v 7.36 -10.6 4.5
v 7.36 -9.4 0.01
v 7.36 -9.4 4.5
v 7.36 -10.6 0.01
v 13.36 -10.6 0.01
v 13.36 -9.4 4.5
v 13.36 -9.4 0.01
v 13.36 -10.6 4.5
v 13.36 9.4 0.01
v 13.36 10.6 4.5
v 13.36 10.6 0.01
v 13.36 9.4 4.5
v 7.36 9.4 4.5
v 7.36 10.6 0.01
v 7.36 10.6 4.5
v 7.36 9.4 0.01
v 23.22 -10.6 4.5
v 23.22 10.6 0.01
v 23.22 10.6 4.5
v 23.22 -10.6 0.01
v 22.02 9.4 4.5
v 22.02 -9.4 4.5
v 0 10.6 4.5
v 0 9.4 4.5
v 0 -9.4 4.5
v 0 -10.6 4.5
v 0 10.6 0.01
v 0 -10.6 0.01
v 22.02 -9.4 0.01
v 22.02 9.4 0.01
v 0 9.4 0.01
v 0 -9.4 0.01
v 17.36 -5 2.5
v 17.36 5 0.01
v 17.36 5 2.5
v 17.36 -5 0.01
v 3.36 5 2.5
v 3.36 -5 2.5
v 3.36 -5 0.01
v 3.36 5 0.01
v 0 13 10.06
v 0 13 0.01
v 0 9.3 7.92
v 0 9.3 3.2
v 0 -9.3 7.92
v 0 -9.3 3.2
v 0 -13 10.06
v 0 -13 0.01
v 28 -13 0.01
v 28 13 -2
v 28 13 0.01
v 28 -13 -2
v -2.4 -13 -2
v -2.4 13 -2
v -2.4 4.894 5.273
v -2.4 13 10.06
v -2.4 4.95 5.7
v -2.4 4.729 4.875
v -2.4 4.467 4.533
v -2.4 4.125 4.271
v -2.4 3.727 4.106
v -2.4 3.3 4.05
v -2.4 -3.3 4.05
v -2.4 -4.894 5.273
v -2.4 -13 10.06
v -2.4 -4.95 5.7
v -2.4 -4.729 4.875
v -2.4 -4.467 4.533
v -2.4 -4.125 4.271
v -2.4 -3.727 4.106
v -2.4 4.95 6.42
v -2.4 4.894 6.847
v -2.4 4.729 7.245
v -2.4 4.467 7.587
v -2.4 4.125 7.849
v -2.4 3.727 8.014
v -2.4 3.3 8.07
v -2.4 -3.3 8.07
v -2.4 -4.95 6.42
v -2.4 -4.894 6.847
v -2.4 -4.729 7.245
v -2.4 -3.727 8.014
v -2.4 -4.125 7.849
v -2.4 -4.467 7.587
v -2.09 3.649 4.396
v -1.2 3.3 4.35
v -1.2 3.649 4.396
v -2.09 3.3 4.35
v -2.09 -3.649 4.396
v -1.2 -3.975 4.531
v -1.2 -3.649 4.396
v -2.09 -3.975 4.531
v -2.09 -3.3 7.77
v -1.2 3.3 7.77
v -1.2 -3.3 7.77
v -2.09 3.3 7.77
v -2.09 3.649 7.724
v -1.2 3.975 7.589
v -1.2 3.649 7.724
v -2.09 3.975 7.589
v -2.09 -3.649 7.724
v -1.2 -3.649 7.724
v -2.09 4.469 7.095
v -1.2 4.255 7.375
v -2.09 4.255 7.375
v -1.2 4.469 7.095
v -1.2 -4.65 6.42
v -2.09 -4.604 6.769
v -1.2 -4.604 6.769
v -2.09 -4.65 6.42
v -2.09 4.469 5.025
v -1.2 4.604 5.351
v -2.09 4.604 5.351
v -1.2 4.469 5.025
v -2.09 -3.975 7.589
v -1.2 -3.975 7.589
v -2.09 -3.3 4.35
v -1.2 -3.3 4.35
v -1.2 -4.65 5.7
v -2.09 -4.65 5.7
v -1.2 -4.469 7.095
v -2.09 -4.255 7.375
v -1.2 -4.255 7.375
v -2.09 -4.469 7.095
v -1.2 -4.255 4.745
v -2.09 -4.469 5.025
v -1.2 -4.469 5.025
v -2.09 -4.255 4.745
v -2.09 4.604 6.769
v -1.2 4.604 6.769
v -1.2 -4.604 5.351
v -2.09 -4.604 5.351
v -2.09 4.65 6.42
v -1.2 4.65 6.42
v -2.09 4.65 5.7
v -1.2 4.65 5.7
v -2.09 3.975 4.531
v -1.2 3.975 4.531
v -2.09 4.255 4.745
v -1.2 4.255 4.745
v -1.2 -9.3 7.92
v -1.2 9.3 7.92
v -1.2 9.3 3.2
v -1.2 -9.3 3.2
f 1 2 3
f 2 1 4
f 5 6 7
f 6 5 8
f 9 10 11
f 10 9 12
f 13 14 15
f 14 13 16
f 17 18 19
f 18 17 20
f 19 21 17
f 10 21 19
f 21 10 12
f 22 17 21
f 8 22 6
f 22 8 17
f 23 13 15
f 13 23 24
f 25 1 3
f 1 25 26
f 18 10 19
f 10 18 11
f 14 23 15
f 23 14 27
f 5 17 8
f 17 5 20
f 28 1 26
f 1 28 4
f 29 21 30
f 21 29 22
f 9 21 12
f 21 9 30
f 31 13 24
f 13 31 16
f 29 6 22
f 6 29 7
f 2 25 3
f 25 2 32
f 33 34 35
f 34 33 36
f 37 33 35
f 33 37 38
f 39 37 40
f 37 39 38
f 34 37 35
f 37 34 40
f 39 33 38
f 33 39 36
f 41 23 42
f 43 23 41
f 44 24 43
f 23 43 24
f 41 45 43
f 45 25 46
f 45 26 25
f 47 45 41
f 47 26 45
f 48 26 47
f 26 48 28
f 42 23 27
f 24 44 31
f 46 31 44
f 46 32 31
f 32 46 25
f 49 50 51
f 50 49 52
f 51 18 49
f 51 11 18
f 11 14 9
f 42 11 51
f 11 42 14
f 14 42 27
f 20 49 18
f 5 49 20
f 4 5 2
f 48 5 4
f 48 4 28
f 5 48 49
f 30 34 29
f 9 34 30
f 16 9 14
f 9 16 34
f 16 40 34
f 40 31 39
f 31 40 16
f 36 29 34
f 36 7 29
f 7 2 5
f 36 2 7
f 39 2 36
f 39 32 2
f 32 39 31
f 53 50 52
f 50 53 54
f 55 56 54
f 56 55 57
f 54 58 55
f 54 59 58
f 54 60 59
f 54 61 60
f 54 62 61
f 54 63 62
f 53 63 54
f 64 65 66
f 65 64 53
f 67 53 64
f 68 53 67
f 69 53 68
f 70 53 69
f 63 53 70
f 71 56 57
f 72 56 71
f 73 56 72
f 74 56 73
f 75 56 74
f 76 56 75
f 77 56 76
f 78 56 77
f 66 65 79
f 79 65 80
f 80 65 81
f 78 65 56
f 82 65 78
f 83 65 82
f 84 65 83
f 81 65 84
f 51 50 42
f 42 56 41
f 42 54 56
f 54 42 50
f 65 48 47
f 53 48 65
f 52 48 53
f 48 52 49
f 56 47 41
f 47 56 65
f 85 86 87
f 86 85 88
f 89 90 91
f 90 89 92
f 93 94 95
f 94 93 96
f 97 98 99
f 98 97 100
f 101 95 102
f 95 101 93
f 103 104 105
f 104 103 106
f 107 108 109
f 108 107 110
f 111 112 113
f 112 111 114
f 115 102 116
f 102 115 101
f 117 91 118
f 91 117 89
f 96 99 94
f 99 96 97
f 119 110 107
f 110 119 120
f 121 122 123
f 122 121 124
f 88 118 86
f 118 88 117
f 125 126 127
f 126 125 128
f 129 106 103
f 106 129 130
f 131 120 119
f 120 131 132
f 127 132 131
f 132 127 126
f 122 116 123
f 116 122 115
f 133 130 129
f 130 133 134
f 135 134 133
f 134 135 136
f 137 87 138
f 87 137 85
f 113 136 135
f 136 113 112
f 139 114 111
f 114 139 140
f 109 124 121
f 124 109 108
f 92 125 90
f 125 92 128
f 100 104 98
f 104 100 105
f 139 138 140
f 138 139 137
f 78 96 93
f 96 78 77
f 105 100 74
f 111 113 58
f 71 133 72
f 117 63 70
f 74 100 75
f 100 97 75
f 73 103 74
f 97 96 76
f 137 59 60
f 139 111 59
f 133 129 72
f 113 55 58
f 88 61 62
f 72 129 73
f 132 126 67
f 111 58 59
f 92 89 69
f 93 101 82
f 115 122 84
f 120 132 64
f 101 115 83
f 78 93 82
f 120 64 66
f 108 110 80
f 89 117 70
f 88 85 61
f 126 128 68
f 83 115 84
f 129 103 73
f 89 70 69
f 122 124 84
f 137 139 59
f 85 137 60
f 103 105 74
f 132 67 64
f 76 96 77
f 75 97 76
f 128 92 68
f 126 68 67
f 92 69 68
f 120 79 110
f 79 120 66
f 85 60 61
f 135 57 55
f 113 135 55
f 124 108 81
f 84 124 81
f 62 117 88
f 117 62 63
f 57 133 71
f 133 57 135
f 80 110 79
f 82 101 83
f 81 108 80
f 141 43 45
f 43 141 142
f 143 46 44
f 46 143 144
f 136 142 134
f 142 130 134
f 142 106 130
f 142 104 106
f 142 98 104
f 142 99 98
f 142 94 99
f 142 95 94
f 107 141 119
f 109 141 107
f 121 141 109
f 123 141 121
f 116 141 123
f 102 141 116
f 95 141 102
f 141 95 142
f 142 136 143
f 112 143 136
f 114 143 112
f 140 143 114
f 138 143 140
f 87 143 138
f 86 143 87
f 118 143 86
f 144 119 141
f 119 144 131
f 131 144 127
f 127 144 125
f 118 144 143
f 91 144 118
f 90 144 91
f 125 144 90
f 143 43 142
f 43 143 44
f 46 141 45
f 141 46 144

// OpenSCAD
// file: ../../usb-c-port/usb-c-port.scad
//-----------------------------------------------------------------------
// USB-C port through a wall, flush: the socket's metal shell sits in a
// close-fitting pocket in the wall, walled in on all four sides, its face
// level with the outside. The cable seats the way it does on a laptop.
//
// A board's socket only overhangs the board edge by a mm or so, less than
// the wall. So the board's end tucks into a shallow relief in the wall's
// inner face, the width of the board, leaving the wall round the socket
// thin enough for the face to reach the outside. When that would leave less
// than usbcMinWall (a socket that barely overhangs), the face sits back from
// the outside instead: usbcRecess() says how far.
//
// Modules, all in the same frame:
//   usbcGhost()     the socket and the board's end, for previews
//   usbcWallCut()   subtract from the wall: socket pocket and board relief
//
// Frame: origin on the floor top at the wall's inner face, under the socket's
// axis. +X into the box, Z up. The wall is X = -wall .. 0. The board is
// component side up, socket on top (top-mount, as on the FireBeetle, C3 Super
// Mini and S3 DevKitC). Units: mm.
//
// usbcBoardEdgeX() gives where the board's edge lands (negative: inside the
// wall), so a holder can put its posts or pocket to match.
//-----------------------------------------------------------------------

//-- The socket: USB-C receptacle shell (USB-IF 8.34 x 2.56 plug, receptacle shell ~8.94 x 3.26)
usbcShellW     = 8.94;
usbcShellH     = 3.26;    // CAL per board: measured 3.2 on the FireBeetle
usbcShellR     = 1.2;     // CAL: end radius. Full round would be 1.63; most shells are squarer
usbcShellDepth = 7.35;    // face to back

//-- The pocket
usbcClearance  = 0.15;    // CAL: per side, shell to pocket. Set by the fit piece
usbcMinWall    = 1.0;     // thinnest wall left round the socket
usbcReliefGap  = 0.3;     // board relief over the board, each side and above/below
usbcChamfer    = 0.3;     // lead-in on the outside edge

//-- How far the socket face sits back from the outside: 0 (flush) unless the socket
//-- overhangs the board edge by less than usbcMinWall
function usbcRecess(overhang, minWall = usbcMinWall) = max(0, minWall - overhang);
//-- X of the board's socket edge in this frame
function usbcBoardEdgeX(wall, overhang, recess) =
  -wall + (is_undef(recess) ? usbcRecess(overhang) : recess) + overhang;
//-- Z of the board's underside above the floor top
function usbcBoardZ(axisZ, pcb, shellH = usbcShellH) = axisZ - shellH/2 - pcb;

module usbcShell2D(grow = 0, w = usbcShellW, h = usbcShellH, r = usbcShellR)
{
  offset(r = r + grow, $fn = 24) square([w - 2*r, h - 2*r], center = true);
}

//-- axisZ: socket axis above the floor. boardW/pcb: the board, for the ghost and relief.
//-- shift: socket centre across the board's width from the board's centre line (+Y)
module usbcGhost(axisZ, wall, overhang, boardW, pcb = 1.6, recess, shift = 0, shellH = usbcShellH, shellW = usbcShellW)
{
  ex = usbcBoardEdgeX(wall, overhang, recess);
  %color("Silver") translate([ex - overhang, 0, axisZ]) rotate([0, 90, 0]) rotate([0, 0, 90])
    linear_extrude(usbcShellDepth) usbcShell2D(w = shellW, h = shellH);
  %color("DarkSlateGray") translate([ex, -boardW/2 - shift, usbcBoardZ(axisZ, pcb, shellH)]) cube([12, boardW, pcb]);
}

module usbcWallCut(axisZ, wall, overhang, boardW, pcb = 1.6, recess, shift = 0,
                   clearance = usbcClearance, shellH = usbcShellH, shellW = usbcShellW, aboveBoard)
{
  rc = is_undef(recess) ? usbcRecess(overhang) : recess;
  ex = usbcBoardEdgeX(wall, overhang, rc);
  bz = usbcBoardZ(axisZ, pcb, shellH);
  //-- what stands on the board near its edge: the socket, unless told taller
  up = is_undef(aboveBoard) ? shellH : aboveBoard;
  assert(ex - overhang + wall >= -0.01, "socket face would stand proud of the wall");
  assert(rc > 0 || overhang >= usbcMinWall - 0.01, "wall round the socket under usbcMinWall");
  //-- socket pocket, through the wall
  translate([-wall - 1, 0, axisZ]) rotate([0, 90, 0]) rotate([0, 0, 90])
    linear_extrude(wall + 2) usbcShell2D(clearance, w = shellW, h = shellH);
  //-- lead-in chamfer on the outside
  translate([-wall, 0, axisZ]) rotate([0, 90, 0]) rotate([0, 0, 90])
    hull()
    {
      translate([0, 0, -0.01]) linear_extrude(0.01) usbcShell2D(clearance + usbcChamfer, w = shellW, h = shellH);
      translate([0, 0, usbcChamfer]) linear_extrude(0.01) usbcShell2D(clearance, w = shellW, h = shellH);
    }
  //-- board relief in the inner face, when the board's edge lands inside the wall
  if (ex < 0)
    translate([ex - usbcReliefGap, -boardW/2 - shift - usbcReliefGap, bz - usbcReliefGap])
      cube([-ex + usbcReliefGap + 1, boardW + 2*usbcReliefGap, pcb + up + 2*usbcReliefGap]);
}
// file: ../../board-pocket/board-pocket.scad
//-----------------------------------------------------------------------
// Board pocket: holds a board that has no mounting holes
//
// The board sits on a central pedestal with a pad of double-sided foam tape
// on top, inside a low wall that follows its outline. The pedestal keeps
// the board's edges off the floor, so lead stubs soldered through the edge
// holes have room underneath; gaps in the wall let the leads out. The wall
// only locates the board: the tape holds it down, and in a closed box a lid
// pad presses a pad of foam onto it (boardLidPad below).
//
// Modules, all in the same frame:
//   boardPocketGhost()   the board and its tape, for previews
//   boardPocketHolder()  the plastic: pedestal and outline wall, add to the floor
//   boardLidPad()        a block hanging from the lid that presses foam onto the board
//   boardLidPadGhost()   the foam under it, squashed, for previews
//
// Frame: origin on the floor top, under the centre of the board's outline.
// X along the board's length l, Y across its width w, Z up. Units: mm.
//
// Sides are listed [-X, +X, -Y, +Y], each one of
//   "gap"    wall with a gap in the middle for leads (gapW wide)
//   "solid"  whole wall: use it where the board takes a push (a plug)
//   "open"   no wall: the board's edge goes into a box wall (a USB port)
//
// Used by esp32-c3-supermini, esp32-s3-devkitc and rs485-max485.
//-----------------------------------------------------------------------

//-- From the controller project's receiver.scad / rack-end.scad (boardPocket), 2026-10-30
bpPedestal  = 2.5;     // floor to the tape: room for lead stubs under the board edges
bpTape      = 1.0;     // double-sided foam tape on the pedestal. CAL: how far it squashes
bpWall      = 1.2;     // outline wall thickness
bpRise      = 1.0;     // wall top above the PCB underside (the controller project's rack-end: 0.8 under the S3's module)
bpClearance = 0.4;     // per side, board outline to wall: PETG. 0.3 for PLA. Set by the fit piece
bpGapW      = 6;       // lead gap in a "gap" side
bpPadInset  = 4;       // default pedestal: the board less this all round

//-- Lid hold-down (the controller project's receiver / rack-end lid pads)
bpFoam      = 3.0;     // CAL: self-adhesive foam stuck under each lid pad
bpSqueeze   = 1.0;     // how far the lid squashes it: ~1/3 for soft foam, 0.3 for felt

//-- PCB underside above the floor top
function boardPocketZ(pedestal = bpPedestal, tape = bpTape) = pedestal + tape;
//-- default pedestal [l, w] for a board
function boardPocketPad(l, w, inset = bpPadInset) = [max(l - 2*inset, 4), max(w - 2*inset, 4)];
//-- Z of a lid pad's underside, pressing on a surface at surfaceZ (board top, or a part on it)
function boardLidPadZ(surfaceZ, foam = bpFoam, squeeze = bpSqueeze) =
  assert(squeeze > 0 && squeeze < foam, "foam would not touch the board")
  surfaceZ + foam - squeeze;

function bpSides4(s) = is_list(s) ? s : [s, s, s, s];

module boardPocketGhost(l, w, pcb = 1.6, pad, pedestal = bpPedestal, tape = bpTape)
{
  p = is_undef(pad) ? boardPocketPad(l, w) : pad;
  %color("White") translate([-p[0]/2, -p[1]/2, pedestal]) cube([p[0], p[1], tape]);
  %color("DarkGreen") translate([-l/2, -w/2, pedestal + tape]) cube([l, w, pcb]);
}

//-- pad: pedestal [l, w]; gapW a number or one per side
module boardPocketHolder(l, w, pad, sides = "gap", gapW = bpGapW, clearance = bpClearance,
                         pedestal = bpPedestal, tape = bpTape, wall = bpWall, rise = bpRise)
{
  p   = is_undef(pad) ? boardPocketPad(l, w) : pad;
  s   = bpSides4(sides);
  g   = bpSides4(gapW);
  ix  = l/2 + clearance;                 // inner half sizes
  iy  = w/2 + clearance;
  top = pedestal + tape + rise;
  assert(p[0] <= l && p[1] <= w, "pedestal bigger than the board");
  for (k = s) assert(k == "gap" || k == "solid" || k == "open", str("unknown side ", k));

  //-- pedestal, centred under the board
  translate([-p[0]/2, -p[1]/2, -0.01]) cube([p[0], p[1], pedestal + 0.01]);
  //-- outline wall
  difference()
  {
    translate([-ix - wall, -iy - wall, -0.01]) cube([2*(ix + wall), 2*(iy + wall), top + 0.01]);
    translate([-ix, -iy, -1]) cube([2*ix, 2*iy, top + 2]);
    for (i = [0 : 3])
    {
      //-- each side's cut, drawn for -X then turned into place
      ax = (i < 2) ? ix : iy;         // inner half size across the side
      al = (i < 2) ? iy : ix;         // half length along it
      rotate([0, 0, [0, 180, 90, 270][i]])   // -X, +X, -Y, +Y
      {
        if (s[i] == "gap")
          translate([-ax - wall - 1, -g[i]/2, -1]) cube([wall + 2, g[i], top + 2]);
        if (s[i] == "open")
          translate([-ax - wall - 1, -al - wall - 1, -1]) cube([wall + 1.01, 2*(al + wall + 1), top + 2]);
      }
    }
  }
}

//-- A lid pad over the rectangle size [x, y] centred at `at`, from the squashed foam up to
//-- lidZ (the lid's inner face in this frame), running `into` up into the lid plate
module boardLidPad(size, at = [0, 0], surfaceZ, lidZ, foam = bpFoam, squeeze = bpSqueeze, into = 0.5)
{
  z0 = boardLidPadZ(surfaceZ, foam, squeeze);
  assert(lidZ > z0, "lid is below the pad: the box is too low for the foam");
  translate([at[0] - size[0]/2, at[1] - size[1]/2, z0]) cube([size[0], size[1], lidZ - z0 + into]);
}

module boardLidPadGhost(size, at = [0, 0], surfaceZ, foam = bpFoam, squeeze = bpSqueeze)
{
  %color("Gray") translate([at[0] - size[0]/2, at[1] - size[1]/2, surfaceZ]) cube([size[0], size[1], foam - squeeze]);
}
// file: ../esp32-c3-supermini.scad
//-----------------------------------------------------------------------
// ESP32-C3 Super Mini, USB-C through a wall
//
// The board has no mounting holes. It sits on a taped pedestal inside an
// outline pocket (board-pocket), with its USB-C socket in a flush pocket in
// the box wall (usb-c-port). The pocket is open at the wall, where the board's
// end tucks into the wall's relief, and whole at the antenna end, which takes
// the plug's push. Its long sides have gaps for the leads.
//
// To fit: tip the board nose-down a few degrees, put the socket into the
// wall, then lay the antenna end down onto the tape.
//
// Modules, all in the same frame:
//   c3MiniGhost()    the board, socket, buttons and antenna, for previews
//   c3MiniHolder()   the plastic: pedestal and outline pocket, add to the floor
//   c3MiniWallCut()  subtract from the wall: the socket pocket and board relief
//   c3MiniLidPads()  blocks under the lid that press foam onto the board
//
// Frame (as usb-c-port): origin on the floor top at the wall's inner face,
// under the socket's axis. +X into the box (toward the antenna end), Z up.
// The wall is X = -wall .. 0. Units: mm.
//
// The socket height isn't chosen: it follows from the pedestal, the tape and
// the PCB (c3MiniAxisZ). Sizes: pick a row of c3Variants by name, or pass
// length / pcb to override one value.
//-----------------------------------------------------------------------

//-- included, not used, so their default values (bpTape, usbcClearance...) are in scope here
include <../board-pocket/board-pocket.scad>
include <../usb-c-port/usb-c-port.scad>

//-- [name, length, width, pcb, USB-C overhang]. Source: the controller project's parts sheet
c3Variants = [
  ["supermini",     22.52, 18.0, 1.0, 1.5],   // diymore 4-pack B0DS23ML1L: STEP outline, PCB CAL (model 0.9)
  ["supermini-1.6", 22.52, 18.0, 1.6, 1.5],   // sellers listing a 1.6 PCB
  ["supermini-24",  24.0,  18.0, 1.0, 1.5],   // longest seller listing (22.5-24): CAL
  ["supermini-plus",22.52, 18.0, 1.0, 1.5],   // SuperMini Plus (V2): same footprint (mischianti.org); rest CAL
];
c3Variant     = "supermini";

//-- The socket: 9.0 x 3.12 on the STEP. The wall pocket uses usb-c-port's 8.94 shell
c3UsbW        = 9.0;      // from the STEP: its wall pocket is cut to this
c3UsbH        = 3.12;     // CAL
c3UsbDepth    = 7.35;     // ghost only: usb-c-port's typical shell
c3PortClear   = usbcClearance;   // per side, shell to wall pocket: usb-c-port's, set by its fit piece

//-- On the board (ghost and lid pads)
c3ButtonX     = 8.8;      // BOOT / RST centres from the USB edge
c3ButtonY     = 2.95;     // either side of the centre line
c3ButtonH     = 1.7;
c3ButtonSize  = 3.0;      // CAL: ghost only
c3AntennaSize = [2.0, 3.2, 1.2];   // CAL: ceramic chip at the far end, ghost only
c3PinPitch    = 15.24;    // header rows, along the long sides

//-- Holder
c3Pad         = [14, 10]; // pedestal: between the pin rows (the controller project's receiver.scad)
c3Sides       = ["open", "solid", "gap", "gap"];   // wall end, antenna end, long sides

function c3Mini(name = c3Variant) = let (i = search([name], c3Variants)[0])
  assert(i != [] && i != undef, str("unknown C3 variant ", name)) c3Variants[i];
//-- [length, width, pcb, overhang] with overrides
function c3MiniDims(variant = c3Variant, length, pcb) = let (v = c3Mini(variant))
  [is_undef(length) ? v[1] : length, v[2], is_undef(pcb) ? v[3] : pcb, v[4]];
function c3MiniAxisZ(pcb, pedestal = bpPedestal, tape = bpTape) =
  boardPocketZ(pedestal, tape) + pcb + c3UsbH/2;
//-- X of the board's USB edge (negative: inside the wall's relief)
function c3MiniEdgeX(wall, variant = c3Variant) = usbcBoardEdgeX(wall, c3Mini(variant)[4]);

module c3MiniGhost(wall, variant = c3Variant, length, pcb, pedestal = bpPedestal, tape = bpTape)
{
  d  = c3MiniDims(variant, length, pcb);
  ex = usbcBoardEdgeX(wall, d[3]);
  bz = boardPocketZ(pedestal, tape);
  top = bz + d[2];
  translate([ex + d[0]/2, 0, 0]) boardPocketGhost(d[0], d[1], d[2], c3Pad, pedestal, tape);
  %color("Silver") translate([ex - d[3], 0, top + c3UsbH/2]) rotate([0, 90, 0]) rotate([0, 0, 90])
    linear_extrude(c3UsbDepth) usbcShell2D(w = c3UsbW, h = c3UsbH);
  for (s = [-1, 1])
    %color("Black") translate([ex + c3ButtonX - c3ButtonSize/2, s*c3ButtonY - c3ButtonSize/2, top])
      cube([c3ButtonSize, c3ButtonSize, c3ButtonH]);
  %color("Tan") translate([ex + d[0] - 1 - c3AntennaSize[0], -c3AntennaSize[1]/2, top]) cube(c3AntennaSize);
}

module c3MiniHolder(wall, variant = c3Variant, length, pcb, clearance = bpClearance,
                    pedestal = bpPedestal, tape = bpTape, rise = bpRise)
{
  d  = c3MiniDims(variant, length, pcb);
  ex = usbcBoardEdgeX(wall, d[3]);
  //-- the pocket's wall end is open; anything left inside the wall goes
  intersection()
  {
    translate([ex + d[0]/2, 0, 0])
      boardPocketHolder(d[0], d[1], c3Pad, c3Sides, clearance = clearance,
                        pedestal = pedestal, tape = tape, rise = rise);
    translate([0, -50, -1]) cube([100, 100, 50]);
  }
}

module c3MiniWallCut(wall, variant = c3Variant, length, pcb, portClear = c3PortClear,
                     pedestal = bpPedestal, tape = bpTape)
{
  d = c3MiniDims(variant, length, pcb);
  usbcWallCut(c3MiniAxisZ(d[2], pedestal, tape), wall, d[3], d[1], d[2],
              clearance = portClear, shellH = c3UsbH, shellW = c3UsbW);
}

//-- Lid pads (the controller project's receiver): one across the antenna end, a narrow one on the socket
//-- that keeps the foam off BOOT/RST. lidZ: the lid's inner face above the floor top.
module c3MiniLidPads(wall, lidZ, variant = c3Variant, length, pcb, foam = bpFoam, squeeze = bpSqueeze,
                     pedestal = bpPedestal, tape = bpTape)
{
  d   = c3MiniDims(variant, length, pcb);
  ex  = usbcBoardEdgeX(wall, d[3]);
  top = boardPocketZ(pedestal, tape) + d[2];
  boardLidPad([5, d[1] - 6], [ex + d[0] - 3.5, 0], top, lidZ, foam, squeeze);
  boardLidPad([4, 5], [max(ex - d[3], 0) + 0.5 + 2, 0], top + c3UsbH, lidZ, foam, squeeze);
}
// main file
// One holder on a piece of wall and floor, for the catalogue.
use <../esp32-c3-supermini.scad>

wall = 2.4;
difference()
{
  union()
  {
    translate([-wall, -13, -2]) cube([wall + 28, 26, 2.01]);
    translate([-wall, -13, 0]) cube([wall, 26, c3MiniAxisZ(1.0) + 4]);
    c3MiniHolder(wall);
  }
  c3MiniWallCut(wall);
}
